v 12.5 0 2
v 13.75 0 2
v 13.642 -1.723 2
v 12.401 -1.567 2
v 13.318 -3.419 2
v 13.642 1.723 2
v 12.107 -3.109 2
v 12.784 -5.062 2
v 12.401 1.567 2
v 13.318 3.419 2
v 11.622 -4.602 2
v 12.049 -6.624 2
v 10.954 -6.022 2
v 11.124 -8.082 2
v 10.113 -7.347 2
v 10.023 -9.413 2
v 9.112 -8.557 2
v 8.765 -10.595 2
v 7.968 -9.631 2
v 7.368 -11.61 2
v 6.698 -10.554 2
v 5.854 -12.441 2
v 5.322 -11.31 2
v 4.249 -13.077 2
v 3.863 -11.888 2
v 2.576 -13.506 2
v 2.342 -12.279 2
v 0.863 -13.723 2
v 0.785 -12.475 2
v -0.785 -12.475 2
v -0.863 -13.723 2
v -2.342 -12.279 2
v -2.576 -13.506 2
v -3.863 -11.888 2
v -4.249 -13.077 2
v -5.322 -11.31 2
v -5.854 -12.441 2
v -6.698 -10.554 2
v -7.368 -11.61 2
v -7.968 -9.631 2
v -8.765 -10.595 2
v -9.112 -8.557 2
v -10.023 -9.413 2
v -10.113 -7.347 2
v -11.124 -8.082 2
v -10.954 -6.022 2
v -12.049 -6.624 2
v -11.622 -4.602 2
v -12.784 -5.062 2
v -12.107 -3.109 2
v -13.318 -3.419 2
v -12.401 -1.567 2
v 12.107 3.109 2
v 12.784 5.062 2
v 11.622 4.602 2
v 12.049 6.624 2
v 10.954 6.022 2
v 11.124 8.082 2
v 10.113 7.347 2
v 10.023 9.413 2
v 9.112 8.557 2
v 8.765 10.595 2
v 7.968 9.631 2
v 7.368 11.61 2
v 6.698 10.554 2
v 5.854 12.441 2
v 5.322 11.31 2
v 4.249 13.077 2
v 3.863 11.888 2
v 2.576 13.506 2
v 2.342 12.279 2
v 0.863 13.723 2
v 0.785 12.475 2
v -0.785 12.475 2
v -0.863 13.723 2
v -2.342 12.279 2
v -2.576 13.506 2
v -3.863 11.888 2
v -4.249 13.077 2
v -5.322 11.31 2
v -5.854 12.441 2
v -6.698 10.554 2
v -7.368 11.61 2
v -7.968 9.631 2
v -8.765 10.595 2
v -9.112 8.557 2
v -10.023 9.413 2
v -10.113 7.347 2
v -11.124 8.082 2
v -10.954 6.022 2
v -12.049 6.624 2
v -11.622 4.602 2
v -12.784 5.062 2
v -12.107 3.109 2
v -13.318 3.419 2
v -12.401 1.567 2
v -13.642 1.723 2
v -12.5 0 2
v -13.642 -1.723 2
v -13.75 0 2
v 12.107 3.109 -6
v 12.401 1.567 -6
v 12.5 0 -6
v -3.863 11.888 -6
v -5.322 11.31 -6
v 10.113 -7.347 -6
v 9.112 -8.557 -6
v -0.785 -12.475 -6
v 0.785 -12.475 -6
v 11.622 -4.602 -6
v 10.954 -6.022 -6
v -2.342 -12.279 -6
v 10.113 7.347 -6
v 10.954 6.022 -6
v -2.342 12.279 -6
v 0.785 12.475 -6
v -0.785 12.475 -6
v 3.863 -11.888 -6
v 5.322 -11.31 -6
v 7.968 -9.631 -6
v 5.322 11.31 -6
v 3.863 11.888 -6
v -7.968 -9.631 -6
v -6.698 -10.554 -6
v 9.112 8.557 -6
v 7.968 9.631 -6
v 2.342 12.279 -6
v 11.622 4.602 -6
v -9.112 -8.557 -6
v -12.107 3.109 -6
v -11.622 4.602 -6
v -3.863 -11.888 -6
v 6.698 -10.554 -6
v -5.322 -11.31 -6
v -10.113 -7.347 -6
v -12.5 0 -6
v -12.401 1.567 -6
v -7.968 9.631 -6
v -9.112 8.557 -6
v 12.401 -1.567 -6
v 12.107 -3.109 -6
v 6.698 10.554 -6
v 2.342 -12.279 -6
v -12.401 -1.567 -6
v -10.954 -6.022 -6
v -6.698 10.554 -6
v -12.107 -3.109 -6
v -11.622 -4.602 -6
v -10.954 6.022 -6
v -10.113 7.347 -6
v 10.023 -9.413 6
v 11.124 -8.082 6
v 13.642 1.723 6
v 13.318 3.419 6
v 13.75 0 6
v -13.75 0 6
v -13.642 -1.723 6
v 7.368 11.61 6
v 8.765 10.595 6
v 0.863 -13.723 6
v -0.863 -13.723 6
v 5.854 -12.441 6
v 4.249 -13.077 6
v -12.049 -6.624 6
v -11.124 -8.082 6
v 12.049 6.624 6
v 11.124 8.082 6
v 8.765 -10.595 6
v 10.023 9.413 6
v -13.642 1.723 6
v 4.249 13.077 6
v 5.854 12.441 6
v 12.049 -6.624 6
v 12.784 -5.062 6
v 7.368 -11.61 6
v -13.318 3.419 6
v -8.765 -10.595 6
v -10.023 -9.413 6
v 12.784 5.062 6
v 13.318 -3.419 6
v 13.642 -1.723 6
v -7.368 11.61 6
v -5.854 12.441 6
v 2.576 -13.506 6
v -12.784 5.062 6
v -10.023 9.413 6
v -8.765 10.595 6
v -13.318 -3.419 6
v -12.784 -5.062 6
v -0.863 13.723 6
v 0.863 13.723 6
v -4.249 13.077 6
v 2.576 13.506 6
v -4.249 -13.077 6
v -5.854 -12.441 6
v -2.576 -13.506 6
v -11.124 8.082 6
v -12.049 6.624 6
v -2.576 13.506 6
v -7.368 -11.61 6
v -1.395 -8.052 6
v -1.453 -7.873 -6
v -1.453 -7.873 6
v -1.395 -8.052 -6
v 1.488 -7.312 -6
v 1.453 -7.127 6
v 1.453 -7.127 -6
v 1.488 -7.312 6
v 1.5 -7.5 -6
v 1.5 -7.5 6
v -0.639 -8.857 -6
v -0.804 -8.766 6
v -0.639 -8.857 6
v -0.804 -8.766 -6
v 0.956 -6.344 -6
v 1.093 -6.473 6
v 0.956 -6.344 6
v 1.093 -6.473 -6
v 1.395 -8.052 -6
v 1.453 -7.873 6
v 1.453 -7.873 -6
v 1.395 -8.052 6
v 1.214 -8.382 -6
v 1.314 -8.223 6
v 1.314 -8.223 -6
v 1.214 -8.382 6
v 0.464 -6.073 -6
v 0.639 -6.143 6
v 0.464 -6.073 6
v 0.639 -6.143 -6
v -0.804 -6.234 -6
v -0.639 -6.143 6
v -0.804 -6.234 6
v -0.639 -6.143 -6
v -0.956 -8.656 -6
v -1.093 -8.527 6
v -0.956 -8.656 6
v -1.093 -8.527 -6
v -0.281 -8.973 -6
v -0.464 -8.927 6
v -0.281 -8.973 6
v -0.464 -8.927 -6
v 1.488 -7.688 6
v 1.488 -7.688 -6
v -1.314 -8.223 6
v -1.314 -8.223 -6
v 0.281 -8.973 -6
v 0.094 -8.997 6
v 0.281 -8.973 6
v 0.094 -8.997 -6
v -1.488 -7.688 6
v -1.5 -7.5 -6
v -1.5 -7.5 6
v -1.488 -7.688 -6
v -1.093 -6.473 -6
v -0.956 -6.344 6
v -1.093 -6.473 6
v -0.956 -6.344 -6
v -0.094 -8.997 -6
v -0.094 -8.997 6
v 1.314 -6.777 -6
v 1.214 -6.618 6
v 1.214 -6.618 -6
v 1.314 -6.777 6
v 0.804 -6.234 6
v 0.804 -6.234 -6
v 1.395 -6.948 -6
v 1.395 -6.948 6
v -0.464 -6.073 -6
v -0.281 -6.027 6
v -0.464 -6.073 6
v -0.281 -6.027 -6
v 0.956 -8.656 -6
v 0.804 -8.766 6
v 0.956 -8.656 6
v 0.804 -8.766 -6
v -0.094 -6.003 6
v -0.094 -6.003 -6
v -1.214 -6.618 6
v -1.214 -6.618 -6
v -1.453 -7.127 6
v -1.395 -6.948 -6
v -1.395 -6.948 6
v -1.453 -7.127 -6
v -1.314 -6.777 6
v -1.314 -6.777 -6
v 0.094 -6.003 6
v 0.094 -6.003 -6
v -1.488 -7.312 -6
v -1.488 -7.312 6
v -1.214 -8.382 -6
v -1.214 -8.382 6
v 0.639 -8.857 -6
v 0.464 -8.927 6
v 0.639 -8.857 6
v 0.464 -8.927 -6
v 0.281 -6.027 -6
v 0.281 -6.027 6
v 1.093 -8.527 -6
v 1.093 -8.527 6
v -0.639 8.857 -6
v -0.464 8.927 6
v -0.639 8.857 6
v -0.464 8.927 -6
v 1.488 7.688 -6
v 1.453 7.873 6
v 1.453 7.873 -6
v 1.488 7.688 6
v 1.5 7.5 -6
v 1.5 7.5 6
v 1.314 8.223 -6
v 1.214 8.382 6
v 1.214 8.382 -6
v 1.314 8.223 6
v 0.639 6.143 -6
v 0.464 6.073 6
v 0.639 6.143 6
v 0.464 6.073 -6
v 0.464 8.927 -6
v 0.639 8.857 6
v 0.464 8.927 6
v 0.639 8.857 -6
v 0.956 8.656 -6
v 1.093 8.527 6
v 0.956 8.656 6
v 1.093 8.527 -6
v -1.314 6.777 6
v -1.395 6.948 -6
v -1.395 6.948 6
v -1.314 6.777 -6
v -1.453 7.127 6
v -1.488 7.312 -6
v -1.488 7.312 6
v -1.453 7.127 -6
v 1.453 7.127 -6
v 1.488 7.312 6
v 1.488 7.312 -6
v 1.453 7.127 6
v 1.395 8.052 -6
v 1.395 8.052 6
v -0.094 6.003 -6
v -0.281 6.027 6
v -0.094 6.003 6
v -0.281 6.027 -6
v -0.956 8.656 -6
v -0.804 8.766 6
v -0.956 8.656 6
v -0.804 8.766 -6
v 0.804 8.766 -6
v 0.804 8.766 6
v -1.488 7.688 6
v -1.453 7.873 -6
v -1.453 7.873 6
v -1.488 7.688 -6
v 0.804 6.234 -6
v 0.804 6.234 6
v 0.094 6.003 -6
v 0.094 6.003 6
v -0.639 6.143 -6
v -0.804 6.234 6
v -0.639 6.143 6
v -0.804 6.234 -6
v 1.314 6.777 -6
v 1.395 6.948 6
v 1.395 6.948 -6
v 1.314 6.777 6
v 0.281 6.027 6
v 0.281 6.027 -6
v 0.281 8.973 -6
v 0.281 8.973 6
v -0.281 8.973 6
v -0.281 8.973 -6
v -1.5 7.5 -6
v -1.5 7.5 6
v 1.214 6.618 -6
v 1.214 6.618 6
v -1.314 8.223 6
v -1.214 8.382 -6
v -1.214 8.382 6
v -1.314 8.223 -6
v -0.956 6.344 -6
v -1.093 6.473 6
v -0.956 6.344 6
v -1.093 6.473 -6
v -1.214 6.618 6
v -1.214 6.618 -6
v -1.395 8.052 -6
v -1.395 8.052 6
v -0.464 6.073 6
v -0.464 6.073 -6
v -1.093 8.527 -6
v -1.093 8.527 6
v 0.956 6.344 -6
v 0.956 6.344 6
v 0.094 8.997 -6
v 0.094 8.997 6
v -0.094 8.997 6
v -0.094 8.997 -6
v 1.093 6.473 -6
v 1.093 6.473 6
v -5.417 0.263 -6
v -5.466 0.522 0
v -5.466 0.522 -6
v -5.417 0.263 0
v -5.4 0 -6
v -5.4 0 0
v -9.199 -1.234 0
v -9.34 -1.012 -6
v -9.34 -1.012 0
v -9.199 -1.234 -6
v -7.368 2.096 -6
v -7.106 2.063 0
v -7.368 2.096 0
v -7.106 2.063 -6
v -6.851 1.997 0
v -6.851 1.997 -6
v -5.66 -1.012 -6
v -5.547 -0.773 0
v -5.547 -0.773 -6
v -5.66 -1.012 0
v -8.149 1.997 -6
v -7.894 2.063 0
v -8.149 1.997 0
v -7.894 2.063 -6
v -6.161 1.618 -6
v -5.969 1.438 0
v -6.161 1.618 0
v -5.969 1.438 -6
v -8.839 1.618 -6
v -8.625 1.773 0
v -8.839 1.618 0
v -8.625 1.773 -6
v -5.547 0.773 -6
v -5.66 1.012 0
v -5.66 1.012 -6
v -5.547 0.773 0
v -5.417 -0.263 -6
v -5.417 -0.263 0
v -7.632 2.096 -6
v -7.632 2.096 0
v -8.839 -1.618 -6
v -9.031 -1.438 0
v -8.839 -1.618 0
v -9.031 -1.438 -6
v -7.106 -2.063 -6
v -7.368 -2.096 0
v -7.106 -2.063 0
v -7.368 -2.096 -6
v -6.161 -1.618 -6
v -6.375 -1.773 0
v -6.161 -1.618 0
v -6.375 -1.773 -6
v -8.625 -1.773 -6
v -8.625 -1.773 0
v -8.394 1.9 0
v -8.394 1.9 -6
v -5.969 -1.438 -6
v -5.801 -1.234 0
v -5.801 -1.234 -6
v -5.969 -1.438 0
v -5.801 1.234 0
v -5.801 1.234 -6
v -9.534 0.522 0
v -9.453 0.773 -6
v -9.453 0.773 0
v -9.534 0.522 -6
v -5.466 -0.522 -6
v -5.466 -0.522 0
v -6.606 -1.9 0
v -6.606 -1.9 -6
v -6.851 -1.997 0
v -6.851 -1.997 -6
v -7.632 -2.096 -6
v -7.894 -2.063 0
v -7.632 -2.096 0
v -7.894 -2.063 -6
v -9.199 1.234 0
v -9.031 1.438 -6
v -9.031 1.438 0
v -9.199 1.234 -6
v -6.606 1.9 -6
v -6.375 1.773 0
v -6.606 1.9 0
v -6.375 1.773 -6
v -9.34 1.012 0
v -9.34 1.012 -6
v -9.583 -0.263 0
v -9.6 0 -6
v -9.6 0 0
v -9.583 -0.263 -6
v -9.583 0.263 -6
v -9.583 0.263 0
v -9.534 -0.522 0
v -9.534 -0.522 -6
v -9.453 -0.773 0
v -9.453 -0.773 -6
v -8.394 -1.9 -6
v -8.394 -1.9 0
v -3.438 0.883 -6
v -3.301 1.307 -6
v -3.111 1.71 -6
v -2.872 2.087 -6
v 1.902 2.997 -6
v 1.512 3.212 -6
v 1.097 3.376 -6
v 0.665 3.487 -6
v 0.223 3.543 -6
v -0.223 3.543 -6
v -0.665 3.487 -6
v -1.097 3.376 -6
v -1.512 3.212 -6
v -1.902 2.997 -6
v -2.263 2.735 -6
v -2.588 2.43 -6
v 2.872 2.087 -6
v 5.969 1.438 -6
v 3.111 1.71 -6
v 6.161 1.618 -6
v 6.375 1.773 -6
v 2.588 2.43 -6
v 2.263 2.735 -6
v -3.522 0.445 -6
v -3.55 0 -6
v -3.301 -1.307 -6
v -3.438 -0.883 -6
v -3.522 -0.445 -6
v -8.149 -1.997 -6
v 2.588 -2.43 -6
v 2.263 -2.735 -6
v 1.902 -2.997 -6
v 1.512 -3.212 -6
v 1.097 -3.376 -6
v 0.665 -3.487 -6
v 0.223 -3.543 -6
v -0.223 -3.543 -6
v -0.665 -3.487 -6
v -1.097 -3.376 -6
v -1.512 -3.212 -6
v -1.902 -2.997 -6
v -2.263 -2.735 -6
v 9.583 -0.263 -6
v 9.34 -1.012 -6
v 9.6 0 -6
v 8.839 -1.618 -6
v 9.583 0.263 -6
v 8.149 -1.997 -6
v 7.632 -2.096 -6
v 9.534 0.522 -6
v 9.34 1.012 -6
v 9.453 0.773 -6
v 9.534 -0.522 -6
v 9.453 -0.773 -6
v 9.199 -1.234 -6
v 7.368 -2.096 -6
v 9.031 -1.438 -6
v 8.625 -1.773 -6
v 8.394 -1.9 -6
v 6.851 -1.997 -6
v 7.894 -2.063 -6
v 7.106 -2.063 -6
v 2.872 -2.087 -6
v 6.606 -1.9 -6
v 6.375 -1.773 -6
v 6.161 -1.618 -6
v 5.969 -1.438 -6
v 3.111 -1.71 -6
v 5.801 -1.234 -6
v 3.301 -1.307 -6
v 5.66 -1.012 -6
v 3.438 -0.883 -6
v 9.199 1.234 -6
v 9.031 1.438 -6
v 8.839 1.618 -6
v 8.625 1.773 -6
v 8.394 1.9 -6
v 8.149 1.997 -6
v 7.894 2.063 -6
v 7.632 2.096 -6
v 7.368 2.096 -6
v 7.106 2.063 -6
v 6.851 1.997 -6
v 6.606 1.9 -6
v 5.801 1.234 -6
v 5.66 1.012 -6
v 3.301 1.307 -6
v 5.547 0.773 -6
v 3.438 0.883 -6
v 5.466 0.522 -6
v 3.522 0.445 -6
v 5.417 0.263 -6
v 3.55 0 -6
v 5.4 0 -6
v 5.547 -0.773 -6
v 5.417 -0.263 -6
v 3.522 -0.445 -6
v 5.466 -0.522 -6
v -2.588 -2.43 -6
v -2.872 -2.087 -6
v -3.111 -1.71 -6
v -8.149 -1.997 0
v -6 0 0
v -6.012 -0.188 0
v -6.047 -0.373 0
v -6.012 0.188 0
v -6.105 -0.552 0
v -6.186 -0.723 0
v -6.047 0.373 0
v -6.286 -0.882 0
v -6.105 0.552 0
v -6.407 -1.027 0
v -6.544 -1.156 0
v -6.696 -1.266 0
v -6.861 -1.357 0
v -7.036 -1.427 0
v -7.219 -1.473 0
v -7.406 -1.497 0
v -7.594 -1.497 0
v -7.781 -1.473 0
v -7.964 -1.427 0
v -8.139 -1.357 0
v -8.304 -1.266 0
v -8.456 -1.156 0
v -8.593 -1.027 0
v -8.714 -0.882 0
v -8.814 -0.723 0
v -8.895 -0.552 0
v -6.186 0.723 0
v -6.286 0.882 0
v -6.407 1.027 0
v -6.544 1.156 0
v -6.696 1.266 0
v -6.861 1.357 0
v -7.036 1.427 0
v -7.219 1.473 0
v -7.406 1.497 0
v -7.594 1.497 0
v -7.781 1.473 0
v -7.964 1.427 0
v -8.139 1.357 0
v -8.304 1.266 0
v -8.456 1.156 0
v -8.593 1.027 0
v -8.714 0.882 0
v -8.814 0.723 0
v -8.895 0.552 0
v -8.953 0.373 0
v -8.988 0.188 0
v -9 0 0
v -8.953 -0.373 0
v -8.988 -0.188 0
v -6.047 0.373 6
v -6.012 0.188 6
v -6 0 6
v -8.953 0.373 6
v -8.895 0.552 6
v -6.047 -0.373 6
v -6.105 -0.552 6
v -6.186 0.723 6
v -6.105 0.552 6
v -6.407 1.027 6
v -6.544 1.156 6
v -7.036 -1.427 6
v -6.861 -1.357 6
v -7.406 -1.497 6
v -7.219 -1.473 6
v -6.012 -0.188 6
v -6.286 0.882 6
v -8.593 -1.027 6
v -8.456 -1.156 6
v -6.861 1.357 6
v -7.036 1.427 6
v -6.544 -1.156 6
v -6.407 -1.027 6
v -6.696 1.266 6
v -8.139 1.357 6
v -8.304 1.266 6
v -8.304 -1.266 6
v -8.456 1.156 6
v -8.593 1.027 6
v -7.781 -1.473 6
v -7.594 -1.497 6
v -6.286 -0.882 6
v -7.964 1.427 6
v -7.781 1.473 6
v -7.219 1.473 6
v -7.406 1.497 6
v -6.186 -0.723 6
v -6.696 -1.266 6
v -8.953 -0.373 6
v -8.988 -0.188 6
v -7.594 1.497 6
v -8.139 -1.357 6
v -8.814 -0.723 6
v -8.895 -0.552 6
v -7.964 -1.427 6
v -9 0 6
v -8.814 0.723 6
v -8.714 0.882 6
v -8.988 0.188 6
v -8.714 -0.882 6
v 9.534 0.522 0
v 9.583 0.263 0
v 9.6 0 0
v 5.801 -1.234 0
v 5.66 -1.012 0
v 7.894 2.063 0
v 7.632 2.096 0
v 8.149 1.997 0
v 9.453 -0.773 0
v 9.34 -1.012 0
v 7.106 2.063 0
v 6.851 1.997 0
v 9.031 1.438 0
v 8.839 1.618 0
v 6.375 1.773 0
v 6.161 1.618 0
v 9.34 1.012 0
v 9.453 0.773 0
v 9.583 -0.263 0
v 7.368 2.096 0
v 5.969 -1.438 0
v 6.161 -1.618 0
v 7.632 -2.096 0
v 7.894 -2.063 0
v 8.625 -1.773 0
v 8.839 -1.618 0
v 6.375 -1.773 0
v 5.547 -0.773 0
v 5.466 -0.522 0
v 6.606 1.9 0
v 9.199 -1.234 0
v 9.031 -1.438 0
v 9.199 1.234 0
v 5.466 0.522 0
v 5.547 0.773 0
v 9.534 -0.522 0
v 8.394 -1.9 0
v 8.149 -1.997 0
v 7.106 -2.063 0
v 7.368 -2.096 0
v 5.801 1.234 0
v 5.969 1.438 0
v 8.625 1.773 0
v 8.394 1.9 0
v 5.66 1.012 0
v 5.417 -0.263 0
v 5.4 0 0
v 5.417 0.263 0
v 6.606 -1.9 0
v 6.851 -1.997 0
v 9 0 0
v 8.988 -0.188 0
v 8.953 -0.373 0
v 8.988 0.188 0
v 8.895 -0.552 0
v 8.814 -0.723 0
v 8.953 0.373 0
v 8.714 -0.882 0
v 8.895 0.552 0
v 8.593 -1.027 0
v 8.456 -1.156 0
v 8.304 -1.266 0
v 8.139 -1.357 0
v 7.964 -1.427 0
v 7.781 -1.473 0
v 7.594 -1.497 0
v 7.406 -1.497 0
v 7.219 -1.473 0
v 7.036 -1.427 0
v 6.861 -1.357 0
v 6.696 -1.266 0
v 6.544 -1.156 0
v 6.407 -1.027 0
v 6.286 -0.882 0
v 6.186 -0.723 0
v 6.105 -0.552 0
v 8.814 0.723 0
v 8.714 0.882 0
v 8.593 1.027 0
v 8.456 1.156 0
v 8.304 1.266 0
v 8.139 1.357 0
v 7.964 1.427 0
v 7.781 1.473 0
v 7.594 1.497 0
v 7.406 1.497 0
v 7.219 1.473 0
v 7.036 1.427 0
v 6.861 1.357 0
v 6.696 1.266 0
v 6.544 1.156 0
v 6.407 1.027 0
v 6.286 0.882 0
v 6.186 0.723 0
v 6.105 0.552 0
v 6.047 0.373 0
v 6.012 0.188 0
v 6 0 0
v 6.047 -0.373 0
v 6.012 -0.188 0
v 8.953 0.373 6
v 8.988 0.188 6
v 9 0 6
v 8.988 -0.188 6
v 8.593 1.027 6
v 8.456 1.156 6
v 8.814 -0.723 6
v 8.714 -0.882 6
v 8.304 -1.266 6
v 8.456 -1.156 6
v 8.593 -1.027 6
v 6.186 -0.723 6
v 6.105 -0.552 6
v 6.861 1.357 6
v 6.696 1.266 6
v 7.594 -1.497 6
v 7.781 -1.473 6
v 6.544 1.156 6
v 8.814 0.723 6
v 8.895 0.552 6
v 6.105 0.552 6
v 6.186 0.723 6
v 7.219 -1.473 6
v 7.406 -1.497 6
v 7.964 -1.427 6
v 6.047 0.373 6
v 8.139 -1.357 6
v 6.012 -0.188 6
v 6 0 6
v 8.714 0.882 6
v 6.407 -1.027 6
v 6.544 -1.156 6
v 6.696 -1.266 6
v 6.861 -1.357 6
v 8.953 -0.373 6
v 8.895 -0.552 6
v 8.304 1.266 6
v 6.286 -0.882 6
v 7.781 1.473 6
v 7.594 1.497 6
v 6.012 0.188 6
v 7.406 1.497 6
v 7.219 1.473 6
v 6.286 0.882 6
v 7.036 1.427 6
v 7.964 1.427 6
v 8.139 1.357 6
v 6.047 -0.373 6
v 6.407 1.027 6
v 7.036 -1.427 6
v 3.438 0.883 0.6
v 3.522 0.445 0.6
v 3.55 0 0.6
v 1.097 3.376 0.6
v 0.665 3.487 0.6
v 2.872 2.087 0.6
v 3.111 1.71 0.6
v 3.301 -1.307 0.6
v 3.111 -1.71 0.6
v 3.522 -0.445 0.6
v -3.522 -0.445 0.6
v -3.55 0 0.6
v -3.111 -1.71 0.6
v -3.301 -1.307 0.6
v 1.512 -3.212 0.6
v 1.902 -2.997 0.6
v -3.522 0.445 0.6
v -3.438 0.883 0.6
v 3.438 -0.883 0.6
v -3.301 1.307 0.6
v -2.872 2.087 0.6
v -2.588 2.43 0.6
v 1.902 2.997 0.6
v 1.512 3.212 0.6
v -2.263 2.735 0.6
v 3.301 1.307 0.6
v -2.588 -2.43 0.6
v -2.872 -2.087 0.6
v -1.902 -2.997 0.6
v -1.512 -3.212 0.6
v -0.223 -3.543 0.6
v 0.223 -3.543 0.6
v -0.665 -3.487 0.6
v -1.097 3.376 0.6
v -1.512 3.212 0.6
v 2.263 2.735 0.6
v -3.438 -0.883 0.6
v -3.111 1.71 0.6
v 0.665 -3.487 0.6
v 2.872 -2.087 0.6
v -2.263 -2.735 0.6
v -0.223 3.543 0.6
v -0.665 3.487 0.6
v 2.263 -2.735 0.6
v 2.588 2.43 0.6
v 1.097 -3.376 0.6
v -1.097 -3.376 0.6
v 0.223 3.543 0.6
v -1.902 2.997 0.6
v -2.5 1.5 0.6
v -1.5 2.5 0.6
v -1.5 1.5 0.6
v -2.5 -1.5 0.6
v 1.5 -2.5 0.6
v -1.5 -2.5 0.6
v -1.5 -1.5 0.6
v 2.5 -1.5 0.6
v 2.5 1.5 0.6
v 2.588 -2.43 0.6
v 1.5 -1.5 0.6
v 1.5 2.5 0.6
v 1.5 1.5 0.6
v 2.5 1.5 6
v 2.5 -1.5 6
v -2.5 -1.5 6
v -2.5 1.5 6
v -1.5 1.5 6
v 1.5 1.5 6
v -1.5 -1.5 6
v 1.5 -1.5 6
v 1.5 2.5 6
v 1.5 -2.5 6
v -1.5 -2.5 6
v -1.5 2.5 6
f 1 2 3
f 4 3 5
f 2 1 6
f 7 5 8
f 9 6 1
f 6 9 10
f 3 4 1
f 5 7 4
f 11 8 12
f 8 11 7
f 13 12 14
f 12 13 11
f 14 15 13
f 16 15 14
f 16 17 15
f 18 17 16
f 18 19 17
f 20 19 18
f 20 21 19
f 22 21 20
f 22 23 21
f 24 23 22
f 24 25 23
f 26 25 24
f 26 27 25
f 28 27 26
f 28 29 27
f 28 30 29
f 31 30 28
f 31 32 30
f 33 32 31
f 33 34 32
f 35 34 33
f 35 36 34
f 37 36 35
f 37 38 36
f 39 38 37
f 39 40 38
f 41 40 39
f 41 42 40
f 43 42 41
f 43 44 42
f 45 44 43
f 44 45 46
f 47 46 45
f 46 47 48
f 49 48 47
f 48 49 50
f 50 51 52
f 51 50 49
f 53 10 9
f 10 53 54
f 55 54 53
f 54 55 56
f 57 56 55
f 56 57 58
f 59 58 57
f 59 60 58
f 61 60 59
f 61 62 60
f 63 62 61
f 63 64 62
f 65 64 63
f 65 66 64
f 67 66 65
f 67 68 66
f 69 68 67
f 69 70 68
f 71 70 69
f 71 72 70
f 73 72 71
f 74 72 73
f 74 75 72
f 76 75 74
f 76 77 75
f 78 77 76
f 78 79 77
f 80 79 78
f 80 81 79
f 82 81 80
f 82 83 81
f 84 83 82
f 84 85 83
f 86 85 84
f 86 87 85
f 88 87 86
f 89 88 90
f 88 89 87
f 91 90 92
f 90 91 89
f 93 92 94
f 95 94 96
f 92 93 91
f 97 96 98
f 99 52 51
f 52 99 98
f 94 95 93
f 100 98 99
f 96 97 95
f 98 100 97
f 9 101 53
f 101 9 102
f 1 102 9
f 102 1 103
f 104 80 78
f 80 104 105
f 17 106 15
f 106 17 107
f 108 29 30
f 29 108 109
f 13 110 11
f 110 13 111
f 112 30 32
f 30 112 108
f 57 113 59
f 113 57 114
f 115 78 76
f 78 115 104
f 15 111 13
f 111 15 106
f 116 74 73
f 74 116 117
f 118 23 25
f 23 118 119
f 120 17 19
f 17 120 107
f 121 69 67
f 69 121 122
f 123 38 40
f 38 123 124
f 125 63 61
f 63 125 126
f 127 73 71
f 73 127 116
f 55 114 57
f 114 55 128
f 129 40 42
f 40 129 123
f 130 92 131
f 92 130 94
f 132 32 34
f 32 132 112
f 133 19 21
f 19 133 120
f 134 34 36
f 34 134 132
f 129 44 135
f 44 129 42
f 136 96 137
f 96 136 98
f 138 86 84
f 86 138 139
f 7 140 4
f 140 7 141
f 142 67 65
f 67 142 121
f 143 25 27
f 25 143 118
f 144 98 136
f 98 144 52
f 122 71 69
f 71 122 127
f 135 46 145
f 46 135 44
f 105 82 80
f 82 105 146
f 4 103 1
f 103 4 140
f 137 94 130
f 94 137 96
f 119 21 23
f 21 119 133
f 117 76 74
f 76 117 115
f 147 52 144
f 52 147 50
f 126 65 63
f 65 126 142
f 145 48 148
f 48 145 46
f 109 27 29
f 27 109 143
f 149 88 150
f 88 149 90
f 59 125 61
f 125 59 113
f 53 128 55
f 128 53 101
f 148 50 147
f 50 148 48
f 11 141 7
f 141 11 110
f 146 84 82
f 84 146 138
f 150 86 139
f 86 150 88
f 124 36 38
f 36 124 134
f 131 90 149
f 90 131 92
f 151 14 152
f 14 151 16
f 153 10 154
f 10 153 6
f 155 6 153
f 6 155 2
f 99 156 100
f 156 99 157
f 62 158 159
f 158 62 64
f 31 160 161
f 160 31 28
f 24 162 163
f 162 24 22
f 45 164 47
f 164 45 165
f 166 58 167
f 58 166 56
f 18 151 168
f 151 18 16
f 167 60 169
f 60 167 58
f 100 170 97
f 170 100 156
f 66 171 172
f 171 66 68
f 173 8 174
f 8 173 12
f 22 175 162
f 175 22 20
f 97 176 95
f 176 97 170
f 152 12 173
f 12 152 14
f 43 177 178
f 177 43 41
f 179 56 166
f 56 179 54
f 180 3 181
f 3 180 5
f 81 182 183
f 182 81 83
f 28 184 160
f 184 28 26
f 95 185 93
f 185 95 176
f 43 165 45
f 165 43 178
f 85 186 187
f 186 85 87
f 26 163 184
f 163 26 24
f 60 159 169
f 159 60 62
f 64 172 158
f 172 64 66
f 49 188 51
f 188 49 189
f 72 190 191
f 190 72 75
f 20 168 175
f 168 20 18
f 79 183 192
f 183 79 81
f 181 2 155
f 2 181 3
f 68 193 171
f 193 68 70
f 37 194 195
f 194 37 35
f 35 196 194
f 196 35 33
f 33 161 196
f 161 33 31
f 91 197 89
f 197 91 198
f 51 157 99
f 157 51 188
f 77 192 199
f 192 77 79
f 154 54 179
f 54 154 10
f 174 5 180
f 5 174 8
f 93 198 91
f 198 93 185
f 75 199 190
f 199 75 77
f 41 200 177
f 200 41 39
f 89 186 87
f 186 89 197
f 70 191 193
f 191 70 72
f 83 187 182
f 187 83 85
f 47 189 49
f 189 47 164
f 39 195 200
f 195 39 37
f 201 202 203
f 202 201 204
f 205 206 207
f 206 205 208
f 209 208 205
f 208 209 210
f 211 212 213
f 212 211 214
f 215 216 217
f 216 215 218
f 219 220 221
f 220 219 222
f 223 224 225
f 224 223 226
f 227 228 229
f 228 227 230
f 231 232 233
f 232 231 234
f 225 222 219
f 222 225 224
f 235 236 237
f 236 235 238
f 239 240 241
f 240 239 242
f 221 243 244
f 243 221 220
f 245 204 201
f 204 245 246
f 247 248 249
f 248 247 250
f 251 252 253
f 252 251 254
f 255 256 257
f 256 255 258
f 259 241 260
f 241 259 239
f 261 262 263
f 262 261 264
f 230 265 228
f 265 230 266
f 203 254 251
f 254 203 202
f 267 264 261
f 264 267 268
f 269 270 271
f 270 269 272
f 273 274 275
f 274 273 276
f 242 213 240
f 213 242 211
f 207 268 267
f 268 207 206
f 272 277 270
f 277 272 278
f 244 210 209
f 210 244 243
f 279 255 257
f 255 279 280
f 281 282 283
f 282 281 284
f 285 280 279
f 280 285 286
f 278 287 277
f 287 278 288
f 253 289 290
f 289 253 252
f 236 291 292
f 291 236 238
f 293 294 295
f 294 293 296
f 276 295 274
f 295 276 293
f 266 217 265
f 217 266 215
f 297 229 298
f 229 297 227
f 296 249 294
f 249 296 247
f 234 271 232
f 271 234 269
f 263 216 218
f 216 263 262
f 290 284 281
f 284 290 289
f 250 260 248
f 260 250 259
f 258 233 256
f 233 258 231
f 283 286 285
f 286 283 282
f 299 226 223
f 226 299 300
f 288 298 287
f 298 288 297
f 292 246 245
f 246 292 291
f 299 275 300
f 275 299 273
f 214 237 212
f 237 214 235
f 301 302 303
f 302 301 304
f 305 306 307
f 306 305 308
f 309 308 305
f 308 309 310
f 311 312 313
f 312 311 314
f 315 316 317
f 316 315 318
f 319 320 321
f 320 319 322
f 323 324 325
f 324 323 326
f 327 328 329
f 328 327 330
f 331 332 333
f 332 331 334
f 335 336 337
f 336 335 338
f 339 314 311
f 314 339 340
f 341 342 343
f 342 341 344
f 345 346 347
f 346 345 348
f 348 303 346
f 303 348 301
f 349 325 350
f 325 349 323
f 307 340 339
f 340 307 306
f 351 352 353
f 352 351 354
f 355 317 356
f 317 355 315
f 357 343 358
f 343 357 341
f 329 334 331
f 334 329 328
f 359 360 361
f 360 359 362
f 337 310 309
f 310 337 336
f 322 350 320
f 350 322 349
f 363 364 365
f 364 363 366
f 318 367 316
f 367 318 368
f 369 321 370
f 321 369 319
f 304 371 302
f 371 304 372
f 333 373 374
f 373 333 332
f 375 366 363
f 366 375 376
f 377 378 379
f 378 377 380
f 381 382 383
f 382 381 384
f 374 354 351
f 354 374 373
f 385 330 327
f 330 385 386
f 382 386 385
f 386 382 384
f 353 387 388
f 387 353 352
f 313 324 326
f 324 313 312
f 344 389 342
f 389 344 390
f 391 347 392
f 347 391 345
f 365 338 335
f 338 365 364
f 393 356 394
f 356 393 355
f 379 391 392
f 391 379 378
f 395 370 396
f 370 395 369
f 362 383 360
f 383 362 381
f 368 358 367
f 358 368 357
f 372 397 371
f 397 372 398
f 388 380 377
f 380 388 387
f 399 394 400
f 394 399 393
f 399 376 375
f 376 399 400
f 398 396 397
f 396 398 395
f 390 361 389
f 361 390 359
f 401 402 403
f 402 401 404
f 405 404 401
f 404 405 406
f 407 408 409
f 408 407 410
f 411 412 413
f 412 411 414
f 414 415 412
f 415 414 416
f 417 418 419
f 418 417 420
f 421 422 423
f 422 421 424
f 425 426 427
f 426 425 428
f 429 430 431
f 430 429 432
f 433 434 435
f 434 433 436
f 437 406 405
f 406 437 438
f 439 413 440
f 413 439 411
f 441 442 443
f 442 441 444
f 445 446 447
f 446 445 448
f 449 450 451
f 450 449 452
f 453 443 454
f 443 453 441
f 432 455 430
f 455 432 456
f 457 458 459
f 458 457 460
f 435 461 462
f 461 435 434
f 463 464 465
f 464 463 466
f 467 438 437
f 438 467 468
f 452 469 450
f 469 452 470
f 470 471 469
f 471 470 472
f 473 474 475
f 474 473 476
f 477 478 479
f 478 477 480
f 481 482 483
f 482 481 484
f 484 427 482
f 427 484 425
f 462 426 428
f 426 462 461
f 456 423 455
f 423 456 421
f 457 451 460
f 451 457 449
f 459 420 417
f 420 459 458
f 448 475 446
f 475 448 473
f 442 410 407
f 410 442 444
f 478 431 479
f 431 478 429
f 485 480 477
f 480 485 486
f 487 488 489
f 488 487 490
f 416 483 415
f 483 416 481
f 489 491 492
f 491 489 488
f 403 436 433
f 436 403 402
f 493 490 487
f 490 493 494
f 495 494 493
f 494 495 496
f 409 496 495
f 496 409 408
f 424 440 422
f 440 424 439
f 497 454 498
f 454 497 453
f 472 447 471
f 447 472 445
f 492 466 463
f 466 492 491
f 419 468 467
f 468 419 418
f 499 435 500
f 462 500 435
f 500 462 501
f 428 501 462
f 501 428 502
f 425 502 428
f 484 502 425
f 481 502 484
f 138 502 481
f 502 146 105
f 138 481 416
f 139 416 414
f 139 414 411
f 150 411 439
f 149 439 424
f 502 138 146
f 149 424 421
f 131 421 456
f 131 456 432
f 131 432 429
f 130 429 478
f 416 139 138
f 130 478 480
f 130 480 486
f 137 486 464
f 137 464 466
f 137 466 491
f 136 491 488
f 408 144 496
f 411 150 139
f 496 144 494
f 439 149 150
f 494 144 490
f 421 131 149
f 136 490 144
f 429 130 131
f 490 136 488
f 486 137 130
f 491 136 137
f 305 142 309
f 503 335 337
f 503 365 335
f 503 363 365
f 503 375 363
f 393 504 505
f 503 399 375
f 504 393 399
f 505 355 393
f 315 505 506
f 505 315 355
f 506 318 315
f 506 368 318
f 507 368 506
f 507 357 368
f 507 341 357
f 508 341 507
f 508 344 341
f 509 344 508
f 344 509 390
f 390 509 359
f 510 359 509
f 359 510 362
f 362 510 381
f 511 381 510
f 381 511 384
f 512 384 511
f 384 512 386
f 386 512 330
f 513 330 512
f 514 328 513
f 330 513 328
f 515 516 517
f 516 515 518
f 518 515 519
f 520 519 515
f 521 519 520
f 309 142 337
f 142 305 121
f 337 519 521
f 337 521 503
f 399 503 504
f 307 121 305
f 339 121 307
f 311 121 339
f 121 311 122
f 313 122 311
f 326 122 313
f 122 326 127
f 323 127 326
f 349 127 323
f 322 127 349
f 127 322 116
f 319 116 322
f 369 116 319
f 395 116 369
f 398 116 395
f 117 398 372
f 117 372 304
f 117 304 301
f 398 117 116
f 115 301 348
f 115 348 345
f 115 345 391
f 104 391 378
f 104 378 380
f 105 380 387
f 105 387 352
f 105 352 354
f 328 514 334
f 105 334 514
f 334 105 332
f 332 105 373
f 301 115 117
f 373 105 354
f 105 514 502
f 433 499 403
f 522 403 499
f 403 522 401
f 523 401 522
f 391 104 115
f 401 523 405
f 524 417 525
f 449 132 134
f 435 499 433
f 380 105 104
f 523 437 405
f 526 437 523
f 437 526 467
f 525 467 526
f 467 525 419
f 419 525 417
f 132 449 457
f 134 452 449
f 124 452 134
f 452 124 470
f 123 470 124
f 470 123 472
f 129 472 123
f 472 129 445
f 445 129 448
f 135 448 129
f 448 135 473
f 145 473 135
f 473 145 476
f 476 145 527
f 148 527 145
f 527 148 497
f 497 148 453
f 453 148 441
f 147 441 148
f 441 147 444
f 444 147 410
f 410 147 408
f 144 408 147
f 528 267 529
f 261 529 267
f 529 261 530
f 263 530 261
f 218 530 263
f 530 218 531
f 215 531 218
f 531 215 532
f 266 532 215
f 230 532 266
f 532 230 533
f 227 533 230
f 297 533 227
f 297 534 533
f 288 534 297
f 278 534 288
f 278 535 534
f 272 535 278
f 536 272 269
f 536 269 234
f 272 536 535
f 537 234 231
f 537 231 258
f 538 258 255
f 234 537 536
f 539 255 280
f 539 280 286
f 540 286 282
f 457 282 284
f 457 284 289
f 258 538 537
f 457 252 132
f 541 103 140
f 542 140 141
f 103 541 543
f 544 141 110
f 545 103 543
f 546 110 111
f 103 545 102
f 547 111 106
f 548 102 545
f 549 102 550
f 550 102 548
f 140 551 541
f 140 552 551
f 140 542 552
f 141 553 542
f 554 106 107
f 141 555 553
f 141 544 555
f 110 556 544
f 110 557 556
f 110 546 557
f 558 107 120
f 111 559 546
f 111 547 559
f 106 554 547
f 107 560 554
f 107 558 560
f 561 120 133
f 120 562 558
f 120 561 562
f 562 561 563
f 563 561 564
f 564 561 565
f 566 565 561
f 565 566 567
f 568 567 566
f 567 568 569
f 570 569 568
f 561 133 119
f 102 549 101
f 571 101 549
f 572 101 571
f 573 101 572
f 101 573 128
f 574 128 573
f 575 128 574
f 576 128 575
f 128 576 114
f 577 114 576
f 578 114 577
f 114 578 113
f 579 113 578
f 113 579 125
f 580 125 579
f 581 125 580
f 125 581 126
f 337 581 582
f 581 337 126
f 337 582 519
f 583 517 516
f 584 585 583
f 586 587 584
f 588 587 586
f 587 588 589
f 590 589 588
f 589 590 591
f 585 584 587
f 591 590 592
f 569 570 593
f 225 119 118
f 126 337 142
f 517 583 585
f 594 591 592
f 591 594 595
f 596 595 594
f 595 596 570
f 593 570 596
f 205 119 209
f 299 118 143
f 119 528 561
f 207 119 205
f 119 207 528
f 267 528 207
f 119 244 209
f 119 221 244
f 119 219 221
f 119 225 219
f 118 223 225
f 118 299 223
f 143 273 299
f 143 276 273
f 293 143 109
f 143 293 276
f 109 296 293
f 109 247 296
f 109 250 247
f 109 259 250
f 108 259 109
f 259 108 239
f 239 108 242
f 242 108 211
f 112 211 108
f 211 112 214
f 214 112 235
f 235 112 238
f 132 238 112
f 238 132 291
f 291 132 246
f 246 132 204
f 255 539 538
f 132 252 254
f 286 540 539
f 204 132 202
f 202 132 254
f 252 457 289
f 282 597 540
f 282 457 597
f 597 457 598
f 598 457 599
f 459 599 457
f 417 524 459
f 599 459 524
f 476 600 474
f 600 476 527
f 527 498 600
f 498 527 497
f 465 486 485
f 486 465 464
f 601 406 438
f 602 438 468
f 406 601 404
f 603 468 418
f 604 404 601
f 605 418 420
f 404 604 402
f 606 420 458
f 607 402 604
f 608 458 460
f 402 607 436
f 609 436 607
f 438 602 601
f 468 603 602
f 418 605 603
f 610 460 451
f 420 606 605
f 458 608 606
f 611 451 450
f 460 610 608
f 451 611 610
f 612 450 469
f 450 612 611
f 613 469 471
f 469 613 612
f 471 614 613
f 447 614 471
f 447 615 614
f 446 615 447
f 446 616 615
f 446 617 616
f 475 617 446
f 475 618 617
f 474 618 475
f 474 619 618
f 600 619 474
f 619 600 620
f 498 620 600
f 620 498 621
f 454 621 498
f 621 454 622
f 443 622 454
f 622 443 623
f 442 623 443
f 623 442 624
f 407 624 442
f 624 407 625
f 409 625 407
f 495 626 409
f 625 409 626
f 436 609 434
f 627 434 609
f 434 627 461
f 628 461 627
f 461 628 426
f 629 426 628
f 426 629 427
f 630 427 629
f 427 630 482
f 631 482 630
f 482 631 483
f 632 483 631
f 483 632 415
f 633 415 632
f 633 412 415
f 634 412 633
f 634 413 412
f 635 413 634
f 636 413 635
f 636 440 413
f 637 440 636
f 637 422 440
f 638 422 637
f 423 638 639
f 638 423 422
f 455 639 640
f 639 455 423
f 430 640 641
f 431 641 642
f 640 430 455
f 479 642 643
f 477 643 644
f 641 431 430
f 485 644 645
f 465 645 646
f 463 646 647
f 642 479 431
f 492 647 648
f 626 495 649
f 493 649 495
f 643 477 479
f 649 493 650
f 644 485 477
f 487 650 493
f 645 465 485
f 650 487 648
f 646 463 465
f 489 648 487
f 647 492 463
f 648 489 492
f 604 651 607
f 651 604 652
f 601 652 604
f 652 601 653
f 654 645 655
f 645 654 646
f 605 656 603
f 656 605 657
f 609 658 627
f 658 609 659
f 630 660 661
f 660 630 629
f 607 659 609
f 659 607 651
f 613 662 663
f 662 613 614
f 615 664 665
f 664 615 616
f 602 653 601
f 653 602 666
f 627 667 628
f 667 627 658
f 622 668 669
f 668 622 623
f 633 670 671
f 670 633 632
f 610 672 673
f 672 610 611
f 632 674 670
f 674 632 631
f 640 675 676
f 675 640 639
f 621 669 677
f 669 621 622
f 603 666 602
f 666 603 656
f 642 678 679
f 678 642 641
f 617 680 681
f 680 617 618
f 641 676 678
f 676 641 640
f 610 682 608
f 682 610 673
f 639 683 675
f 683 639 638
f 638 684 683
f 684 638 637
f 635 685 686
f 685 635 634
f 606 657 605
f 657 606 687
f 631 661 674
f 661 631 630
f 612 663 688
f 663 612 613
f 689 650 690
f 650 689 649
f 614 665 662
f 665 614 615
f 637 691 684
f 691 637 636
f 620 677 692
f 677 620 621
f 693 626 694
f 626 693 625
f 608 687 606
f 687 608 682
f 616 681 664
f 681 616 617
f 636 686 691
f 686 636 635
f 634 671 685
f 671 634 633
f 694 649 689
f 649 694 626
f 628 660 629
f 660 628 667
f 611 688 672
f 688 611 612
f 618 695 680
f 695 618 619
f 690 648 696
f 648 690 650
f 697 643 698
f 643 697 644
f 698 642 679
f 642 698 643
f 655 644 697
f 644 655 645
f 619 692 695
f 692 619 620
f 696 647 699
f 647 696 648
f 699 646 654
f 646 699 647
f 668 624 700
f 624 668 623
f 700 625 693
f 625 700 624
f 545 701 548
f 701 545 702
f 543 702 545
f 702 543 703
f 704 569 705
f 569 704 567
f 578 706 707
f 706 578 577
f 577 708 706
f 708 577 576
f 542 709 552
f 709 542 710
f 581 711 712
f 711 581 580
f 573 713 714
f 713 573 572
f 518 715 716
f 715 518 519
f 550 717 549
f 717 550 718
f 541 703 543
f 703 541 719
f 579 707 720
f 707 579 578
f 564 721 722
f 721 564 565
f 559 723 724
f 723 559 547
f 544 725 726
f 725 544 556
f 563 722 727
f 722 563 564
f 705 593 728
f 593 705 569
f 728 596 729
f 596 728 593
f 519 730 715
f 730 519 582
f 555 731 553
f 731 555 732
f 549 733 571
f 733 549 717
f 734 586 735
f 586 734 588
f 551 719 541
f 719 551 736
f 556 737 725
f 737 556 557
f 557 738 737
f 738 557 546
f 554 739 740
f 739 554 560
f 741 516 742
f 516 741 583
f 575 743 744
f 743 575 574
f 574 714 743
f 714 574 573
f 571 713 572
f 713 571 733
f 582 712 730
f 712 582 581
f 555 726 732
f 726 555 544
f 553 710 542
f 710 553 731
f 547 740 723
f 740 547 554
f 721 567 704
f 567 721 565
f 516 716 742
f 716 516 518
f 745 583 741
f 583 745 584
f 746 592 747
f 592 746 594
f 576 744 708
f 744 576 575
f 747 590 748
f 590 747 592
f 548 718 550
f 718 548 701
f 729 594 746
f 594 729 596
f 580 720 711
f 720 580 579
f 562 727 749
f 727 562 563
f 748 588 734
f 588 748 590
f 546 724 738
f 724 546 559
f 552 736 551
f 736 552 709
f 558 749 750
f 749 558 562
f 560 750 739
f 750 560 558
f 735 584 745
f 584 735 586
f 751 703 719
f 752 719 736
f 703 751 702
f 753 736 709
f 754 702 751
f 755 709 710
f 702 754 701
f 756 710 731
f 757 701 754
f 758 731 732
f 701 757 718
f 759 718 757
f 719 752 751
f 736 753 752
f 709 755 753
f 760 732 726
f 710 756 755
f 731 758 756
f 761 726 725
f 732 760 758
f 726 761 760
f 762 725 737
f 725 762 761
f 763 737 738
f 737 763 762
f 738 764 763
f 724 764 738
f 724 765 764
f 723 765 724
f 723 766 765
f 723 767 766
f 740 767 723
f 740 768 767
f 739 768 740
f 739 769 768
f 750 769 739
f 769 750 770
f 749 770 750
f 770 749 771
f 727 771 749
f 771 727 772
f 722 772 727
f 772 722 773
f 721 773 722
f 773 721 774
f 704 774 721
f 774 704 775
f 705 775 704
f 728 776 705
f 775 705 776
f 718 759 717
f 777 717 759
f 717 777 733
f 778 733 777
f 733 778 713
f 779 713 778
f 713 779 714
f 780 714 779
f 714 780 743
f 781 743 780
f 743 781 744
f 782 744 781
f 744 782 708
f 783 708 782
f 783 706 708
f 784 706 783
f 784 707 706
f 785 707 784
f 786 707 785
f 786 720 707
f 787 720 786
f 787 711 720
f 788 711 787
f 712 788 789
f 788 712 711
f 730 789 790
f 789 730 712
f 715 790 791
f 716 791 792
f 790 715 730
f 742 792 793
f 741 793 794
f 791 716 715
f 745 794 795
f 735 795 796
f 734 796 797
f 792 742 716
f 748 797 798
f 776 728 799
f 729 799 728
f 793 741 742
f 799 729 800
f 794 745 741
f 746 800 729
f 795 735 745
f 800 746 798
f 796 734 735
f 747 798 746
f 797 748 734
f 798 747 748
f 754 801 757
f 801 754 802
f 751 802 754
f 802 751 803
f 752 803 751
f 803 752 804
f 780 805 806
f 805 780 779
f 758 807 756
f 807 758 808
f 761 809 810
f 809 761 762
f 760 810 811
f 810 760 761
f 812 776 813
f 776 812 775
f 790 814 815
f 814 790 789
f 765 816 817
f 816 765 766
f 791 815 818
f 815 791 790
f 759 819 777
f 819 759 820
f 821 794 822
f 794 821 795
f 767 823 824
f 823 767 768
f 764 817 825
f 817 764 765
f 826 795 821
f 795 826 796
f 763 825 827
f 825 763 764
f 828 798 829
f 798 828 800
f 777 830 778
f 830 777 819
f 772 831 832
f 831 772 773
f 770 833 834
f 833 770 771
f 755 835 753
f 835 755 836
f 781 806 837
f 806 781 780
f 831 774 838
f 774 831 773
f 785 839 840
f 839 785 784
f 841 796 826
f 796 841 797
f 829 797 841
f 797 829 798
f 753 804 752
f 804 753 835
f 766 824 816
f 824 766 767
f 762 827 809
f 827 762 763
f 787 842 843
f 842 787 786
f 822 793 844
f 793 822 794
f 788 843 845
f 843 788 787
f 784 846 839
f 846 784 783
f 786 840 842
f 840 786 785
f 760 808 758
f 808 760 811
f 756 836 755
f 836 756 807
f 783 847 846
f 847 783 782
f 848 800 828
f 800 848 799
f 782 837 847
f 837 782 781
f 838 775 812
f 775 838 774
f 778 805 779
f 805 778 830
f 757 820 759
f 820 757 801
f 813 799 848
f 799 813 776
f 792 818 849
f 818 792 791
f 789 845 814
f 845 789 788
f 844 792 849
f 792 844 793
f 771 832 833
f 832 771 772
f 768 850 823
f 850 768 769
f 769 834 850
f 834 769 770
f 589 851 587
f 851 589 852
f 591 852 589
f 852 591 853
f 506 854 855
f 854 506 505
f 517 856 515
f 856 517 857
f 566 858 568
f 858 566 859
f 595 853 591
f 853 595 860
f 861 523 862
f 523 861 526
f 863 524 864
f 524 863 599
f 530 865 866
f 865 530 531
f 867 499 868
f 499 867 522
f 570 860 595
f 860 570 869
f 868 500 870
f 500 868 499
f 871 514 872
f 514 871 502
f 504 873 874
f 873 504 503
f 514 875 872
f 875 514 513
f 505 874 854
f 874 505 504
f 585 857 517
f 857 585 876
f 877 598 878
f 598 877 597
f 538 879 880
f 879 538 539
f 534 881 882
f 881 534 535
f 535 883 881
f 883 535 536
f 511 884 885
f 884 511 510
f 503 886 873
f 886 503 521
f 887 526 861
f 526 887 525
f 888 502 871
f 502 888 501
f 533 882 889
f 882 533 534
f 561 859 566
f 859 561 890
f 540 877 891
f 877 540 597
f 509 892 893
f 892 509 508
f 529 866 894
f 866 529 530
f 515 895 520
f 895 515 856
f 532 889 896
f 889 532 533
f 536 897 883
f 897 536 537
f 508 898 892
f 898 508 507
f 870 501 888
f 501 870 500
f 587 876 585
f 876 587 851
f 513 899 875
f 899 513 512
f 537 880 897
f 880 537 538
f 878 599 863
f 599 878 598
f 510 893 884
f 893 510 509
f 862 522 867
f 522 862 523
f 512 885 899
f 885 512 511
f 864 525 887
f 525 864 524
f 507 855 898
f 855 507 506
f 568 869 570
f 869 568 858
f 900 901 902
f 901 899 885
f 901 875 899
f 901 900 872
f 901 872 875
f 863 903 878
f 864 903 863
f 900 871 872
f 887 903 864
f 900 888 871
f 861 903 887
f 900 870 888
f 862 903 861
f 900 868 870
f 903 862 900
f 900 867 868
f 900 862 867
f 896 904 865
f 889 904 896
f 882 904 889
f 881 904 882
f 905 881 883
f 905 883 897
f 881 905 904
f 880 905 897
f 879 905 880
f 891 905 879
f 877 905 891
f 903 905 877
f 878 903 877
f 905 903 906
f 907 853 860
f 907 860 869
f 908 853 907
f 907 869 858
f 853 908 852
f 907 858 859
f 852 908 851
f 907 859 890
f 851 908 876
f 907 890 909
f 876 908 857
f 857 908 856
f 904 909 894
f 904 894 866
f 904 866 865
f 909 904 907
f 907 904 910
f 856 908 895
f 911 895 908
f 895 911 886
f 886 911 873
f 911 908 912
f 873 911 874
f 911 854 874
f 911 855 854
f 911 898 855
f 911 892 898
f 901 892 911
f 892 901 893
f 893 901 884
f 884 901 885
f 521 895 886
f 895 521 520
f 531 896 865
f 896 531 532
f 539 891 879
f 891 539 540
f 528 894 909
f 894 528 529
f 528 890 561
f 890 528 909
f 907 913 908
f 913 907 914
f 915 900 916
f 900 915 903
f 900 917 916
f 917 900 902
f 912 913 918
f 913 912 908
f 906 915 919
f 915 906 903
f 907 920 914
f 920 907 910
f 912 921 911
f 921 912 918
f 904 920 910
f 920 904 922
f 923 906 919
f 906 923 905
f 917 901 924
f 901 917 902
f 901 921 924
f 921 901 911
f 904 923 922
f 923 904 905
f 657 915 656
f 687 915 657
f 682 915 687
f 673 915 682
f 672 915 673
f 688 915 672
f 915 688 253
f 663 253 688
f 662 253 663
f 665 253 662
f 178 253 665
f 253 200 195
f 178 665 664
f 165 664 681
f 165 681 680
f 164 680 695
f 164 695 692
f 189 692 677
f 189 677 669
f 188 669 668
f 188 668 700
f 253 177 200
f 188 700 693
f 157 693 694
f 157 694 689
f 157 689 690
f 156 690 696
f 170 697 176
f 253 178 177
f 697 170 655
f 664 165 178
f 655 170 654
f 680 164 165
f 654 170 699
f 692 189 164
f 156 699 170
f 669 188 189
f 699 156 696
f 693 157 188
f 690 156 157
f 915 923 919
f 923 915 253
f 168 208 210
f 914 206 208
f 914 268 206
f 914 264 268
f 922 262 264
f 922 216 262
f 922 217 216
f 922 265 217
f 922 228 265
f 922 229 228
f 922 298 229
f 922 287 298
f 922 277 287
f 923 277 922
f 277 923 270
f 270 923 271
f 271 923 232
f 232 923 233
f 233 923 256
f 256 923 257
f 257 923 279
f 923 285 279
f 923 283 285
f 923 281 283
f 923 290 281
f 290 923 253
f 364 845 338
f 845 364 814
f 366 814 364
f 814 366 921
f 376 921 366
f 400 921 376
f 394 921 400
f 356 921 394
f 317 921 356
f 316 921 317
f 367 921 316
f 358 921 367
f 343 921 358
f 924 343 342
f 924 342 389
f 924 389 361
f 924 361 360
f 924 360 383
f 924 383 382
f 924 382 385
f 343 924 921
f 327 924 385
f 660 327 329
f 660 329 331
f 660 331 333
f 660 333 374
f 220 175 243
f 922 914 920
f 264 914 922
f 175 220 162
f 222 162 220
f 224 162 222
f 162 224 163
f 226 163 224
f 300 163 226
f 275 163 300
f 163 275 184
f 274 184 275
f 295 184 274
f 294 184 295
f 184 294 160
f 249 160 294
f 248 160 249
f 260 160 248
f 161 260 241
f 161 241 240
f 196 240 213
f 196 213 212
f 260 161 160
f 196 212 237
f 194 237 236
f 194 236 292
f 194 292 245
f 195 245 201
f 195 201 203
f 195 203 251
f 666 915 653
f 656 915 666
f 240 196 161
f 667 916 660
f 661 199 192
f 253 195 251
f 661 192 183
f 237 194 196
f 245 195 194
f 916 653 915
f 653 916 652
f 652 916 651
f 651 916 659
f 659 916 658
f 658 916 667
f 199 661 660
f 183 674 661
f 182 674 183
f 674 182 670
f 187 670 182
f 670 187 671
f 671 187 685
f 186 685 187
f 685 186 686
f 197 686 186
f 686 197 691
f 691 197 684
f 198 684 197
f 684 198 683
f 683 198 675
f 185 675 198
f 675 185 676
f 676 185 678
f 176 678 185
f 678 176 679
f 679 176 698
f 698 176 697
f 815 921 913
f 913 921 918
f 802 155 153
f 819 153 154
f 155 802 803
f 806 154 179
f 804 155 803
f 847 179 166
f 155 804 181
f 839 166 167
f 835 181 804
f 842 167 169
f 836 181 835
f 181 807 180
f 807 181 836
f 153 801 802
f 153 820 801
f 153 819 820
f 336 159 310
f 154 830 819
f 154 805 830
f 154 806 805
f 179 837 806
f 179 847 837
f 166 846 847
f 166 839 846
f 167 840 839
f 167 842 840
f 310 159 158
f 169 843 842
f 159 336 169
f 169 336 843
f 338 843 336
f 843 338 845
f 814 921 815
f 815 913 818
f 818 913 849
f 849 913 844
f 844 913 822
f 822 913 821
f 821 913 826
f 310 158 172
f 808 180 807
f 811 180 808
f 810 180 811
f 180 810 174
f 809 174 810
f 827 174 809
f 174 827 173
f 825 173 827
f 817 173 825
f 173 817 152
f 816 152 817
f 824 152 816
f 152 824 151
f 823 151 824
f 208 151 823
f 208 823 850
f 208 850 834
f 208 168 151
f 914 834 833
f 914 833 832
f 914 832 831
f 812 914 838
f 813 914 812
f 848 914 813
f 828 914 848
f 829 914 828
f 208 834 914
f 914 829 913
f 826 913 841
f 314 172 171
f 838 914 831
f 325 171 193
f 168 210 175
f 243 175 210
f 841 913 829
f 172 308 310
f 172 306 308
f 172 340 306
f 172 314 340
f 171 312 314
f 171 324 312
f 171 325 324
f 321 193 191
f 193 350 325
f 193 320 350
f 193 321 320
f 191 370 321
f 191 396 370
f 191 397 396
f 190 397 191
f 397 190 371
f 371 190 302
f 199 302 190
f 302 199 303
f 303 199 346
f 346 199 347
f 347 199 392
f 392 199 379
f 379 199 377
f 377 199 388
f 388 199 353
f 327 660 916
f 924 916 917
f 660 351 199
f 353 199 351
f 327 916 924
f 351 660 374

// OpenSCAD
$fn = 50;

difference() {
	union() {
		translate(v = [0, 0, 0]) {
			rotate(a = [0, 0, 0]) {
				difference() {
					union() {
						translate(v = [0, 0, -6.0]) {
							cylinder(h = 12, r = 14.5);
						}
					}
					union() {
						translate(v = [0, 0, 0]) {
							rotate(a = [0, 0, 0]) {
								difference() {
									union() {
										translate(v = [0, 0, -2.0]) {
											cylinder(h = 4, r = 16.0);
										}
									}
									union() {
										translate(v = [0, 0, -2.01]) {
											cylinder(h = 4.02, r = 12.5);
										}
									}
								}
							}
						}
						translate(v = [0, 0, -3]) {
							rotate(a = [0, 0, 0]) {
								difference() {
									union() {
										translate(v = [0, 0, -2.0]) {
											cylinder(h = 4, r = 16.0);
										}
									}
									union() {
										translate(v = [0, 0, -2.01]) {
											cylinder(h = 4.02, r = 12.5);
										}
									}
								}
							}
						}
						translate(v = [0, 0, -6]) {
							rotate(a = [0, 0, 0]) {
								difference() {
									union() {
										translate(v = [0, 0, -2.0]) {
											cylinder(h = 4, r = 16.0);
										}
									}
									union() {
										translate(v = [0, 0, -2.01]) {
											cylinder(h = 4.02, r = 12.5);
										}
									}
								}
							}
						}
						translate(v = [0, 0, 0]) {
							rotate(a = [0, 0, 0]) {
								difference() {
									union() {
										translate(v = [0, 0, -21.0]) {
											cylinder(h = 42, r = 14.75);
										}
									}
									union() {
										translate(v = [0, 0, -21.01]) {
											cylinder(h = 42.02, r = 13.75);
										}
									}
								}
							}
						}
						translate(v = [0.0, -7.5, -7.0]) {
							cylinder(h = 14, r = 1.5);
						}
						translate(v = [0.0, 7.5, -7.0]) {
							cylinder(h = 14, r = 1.5);
						}
						translate(v = [-7.5, 0, -6.0]) {
							cylinder(h = 6, r = 2.1);
						}
						translate(v = [-7.5, 0, -7.0]) {
							cylinder(h = 14, r = 1.5);
						}
						translate(v = [7.5, 0, -6.0]) {
							cylinder(h = 6, r = 2.1);
						}
						translate(v = [7.5, 0, -7.0]) {
							cylinder(h = 14, r = 1.5);
						}
						translate(v = [0, 0, -6.000000000000001]) {
							cylinder(h = 6.6, r = 3.55);
						}
						translate(v = [-2.5, -1.5, -7.0]) {
							cube(size = [5, 3, 14]);
						}
						translate(v = [-1.5, -2.5, -7.0]) {
							cube(size = [3, 5, 14]);
						}
					}
				}
			}
		}
	}
	union();
}
